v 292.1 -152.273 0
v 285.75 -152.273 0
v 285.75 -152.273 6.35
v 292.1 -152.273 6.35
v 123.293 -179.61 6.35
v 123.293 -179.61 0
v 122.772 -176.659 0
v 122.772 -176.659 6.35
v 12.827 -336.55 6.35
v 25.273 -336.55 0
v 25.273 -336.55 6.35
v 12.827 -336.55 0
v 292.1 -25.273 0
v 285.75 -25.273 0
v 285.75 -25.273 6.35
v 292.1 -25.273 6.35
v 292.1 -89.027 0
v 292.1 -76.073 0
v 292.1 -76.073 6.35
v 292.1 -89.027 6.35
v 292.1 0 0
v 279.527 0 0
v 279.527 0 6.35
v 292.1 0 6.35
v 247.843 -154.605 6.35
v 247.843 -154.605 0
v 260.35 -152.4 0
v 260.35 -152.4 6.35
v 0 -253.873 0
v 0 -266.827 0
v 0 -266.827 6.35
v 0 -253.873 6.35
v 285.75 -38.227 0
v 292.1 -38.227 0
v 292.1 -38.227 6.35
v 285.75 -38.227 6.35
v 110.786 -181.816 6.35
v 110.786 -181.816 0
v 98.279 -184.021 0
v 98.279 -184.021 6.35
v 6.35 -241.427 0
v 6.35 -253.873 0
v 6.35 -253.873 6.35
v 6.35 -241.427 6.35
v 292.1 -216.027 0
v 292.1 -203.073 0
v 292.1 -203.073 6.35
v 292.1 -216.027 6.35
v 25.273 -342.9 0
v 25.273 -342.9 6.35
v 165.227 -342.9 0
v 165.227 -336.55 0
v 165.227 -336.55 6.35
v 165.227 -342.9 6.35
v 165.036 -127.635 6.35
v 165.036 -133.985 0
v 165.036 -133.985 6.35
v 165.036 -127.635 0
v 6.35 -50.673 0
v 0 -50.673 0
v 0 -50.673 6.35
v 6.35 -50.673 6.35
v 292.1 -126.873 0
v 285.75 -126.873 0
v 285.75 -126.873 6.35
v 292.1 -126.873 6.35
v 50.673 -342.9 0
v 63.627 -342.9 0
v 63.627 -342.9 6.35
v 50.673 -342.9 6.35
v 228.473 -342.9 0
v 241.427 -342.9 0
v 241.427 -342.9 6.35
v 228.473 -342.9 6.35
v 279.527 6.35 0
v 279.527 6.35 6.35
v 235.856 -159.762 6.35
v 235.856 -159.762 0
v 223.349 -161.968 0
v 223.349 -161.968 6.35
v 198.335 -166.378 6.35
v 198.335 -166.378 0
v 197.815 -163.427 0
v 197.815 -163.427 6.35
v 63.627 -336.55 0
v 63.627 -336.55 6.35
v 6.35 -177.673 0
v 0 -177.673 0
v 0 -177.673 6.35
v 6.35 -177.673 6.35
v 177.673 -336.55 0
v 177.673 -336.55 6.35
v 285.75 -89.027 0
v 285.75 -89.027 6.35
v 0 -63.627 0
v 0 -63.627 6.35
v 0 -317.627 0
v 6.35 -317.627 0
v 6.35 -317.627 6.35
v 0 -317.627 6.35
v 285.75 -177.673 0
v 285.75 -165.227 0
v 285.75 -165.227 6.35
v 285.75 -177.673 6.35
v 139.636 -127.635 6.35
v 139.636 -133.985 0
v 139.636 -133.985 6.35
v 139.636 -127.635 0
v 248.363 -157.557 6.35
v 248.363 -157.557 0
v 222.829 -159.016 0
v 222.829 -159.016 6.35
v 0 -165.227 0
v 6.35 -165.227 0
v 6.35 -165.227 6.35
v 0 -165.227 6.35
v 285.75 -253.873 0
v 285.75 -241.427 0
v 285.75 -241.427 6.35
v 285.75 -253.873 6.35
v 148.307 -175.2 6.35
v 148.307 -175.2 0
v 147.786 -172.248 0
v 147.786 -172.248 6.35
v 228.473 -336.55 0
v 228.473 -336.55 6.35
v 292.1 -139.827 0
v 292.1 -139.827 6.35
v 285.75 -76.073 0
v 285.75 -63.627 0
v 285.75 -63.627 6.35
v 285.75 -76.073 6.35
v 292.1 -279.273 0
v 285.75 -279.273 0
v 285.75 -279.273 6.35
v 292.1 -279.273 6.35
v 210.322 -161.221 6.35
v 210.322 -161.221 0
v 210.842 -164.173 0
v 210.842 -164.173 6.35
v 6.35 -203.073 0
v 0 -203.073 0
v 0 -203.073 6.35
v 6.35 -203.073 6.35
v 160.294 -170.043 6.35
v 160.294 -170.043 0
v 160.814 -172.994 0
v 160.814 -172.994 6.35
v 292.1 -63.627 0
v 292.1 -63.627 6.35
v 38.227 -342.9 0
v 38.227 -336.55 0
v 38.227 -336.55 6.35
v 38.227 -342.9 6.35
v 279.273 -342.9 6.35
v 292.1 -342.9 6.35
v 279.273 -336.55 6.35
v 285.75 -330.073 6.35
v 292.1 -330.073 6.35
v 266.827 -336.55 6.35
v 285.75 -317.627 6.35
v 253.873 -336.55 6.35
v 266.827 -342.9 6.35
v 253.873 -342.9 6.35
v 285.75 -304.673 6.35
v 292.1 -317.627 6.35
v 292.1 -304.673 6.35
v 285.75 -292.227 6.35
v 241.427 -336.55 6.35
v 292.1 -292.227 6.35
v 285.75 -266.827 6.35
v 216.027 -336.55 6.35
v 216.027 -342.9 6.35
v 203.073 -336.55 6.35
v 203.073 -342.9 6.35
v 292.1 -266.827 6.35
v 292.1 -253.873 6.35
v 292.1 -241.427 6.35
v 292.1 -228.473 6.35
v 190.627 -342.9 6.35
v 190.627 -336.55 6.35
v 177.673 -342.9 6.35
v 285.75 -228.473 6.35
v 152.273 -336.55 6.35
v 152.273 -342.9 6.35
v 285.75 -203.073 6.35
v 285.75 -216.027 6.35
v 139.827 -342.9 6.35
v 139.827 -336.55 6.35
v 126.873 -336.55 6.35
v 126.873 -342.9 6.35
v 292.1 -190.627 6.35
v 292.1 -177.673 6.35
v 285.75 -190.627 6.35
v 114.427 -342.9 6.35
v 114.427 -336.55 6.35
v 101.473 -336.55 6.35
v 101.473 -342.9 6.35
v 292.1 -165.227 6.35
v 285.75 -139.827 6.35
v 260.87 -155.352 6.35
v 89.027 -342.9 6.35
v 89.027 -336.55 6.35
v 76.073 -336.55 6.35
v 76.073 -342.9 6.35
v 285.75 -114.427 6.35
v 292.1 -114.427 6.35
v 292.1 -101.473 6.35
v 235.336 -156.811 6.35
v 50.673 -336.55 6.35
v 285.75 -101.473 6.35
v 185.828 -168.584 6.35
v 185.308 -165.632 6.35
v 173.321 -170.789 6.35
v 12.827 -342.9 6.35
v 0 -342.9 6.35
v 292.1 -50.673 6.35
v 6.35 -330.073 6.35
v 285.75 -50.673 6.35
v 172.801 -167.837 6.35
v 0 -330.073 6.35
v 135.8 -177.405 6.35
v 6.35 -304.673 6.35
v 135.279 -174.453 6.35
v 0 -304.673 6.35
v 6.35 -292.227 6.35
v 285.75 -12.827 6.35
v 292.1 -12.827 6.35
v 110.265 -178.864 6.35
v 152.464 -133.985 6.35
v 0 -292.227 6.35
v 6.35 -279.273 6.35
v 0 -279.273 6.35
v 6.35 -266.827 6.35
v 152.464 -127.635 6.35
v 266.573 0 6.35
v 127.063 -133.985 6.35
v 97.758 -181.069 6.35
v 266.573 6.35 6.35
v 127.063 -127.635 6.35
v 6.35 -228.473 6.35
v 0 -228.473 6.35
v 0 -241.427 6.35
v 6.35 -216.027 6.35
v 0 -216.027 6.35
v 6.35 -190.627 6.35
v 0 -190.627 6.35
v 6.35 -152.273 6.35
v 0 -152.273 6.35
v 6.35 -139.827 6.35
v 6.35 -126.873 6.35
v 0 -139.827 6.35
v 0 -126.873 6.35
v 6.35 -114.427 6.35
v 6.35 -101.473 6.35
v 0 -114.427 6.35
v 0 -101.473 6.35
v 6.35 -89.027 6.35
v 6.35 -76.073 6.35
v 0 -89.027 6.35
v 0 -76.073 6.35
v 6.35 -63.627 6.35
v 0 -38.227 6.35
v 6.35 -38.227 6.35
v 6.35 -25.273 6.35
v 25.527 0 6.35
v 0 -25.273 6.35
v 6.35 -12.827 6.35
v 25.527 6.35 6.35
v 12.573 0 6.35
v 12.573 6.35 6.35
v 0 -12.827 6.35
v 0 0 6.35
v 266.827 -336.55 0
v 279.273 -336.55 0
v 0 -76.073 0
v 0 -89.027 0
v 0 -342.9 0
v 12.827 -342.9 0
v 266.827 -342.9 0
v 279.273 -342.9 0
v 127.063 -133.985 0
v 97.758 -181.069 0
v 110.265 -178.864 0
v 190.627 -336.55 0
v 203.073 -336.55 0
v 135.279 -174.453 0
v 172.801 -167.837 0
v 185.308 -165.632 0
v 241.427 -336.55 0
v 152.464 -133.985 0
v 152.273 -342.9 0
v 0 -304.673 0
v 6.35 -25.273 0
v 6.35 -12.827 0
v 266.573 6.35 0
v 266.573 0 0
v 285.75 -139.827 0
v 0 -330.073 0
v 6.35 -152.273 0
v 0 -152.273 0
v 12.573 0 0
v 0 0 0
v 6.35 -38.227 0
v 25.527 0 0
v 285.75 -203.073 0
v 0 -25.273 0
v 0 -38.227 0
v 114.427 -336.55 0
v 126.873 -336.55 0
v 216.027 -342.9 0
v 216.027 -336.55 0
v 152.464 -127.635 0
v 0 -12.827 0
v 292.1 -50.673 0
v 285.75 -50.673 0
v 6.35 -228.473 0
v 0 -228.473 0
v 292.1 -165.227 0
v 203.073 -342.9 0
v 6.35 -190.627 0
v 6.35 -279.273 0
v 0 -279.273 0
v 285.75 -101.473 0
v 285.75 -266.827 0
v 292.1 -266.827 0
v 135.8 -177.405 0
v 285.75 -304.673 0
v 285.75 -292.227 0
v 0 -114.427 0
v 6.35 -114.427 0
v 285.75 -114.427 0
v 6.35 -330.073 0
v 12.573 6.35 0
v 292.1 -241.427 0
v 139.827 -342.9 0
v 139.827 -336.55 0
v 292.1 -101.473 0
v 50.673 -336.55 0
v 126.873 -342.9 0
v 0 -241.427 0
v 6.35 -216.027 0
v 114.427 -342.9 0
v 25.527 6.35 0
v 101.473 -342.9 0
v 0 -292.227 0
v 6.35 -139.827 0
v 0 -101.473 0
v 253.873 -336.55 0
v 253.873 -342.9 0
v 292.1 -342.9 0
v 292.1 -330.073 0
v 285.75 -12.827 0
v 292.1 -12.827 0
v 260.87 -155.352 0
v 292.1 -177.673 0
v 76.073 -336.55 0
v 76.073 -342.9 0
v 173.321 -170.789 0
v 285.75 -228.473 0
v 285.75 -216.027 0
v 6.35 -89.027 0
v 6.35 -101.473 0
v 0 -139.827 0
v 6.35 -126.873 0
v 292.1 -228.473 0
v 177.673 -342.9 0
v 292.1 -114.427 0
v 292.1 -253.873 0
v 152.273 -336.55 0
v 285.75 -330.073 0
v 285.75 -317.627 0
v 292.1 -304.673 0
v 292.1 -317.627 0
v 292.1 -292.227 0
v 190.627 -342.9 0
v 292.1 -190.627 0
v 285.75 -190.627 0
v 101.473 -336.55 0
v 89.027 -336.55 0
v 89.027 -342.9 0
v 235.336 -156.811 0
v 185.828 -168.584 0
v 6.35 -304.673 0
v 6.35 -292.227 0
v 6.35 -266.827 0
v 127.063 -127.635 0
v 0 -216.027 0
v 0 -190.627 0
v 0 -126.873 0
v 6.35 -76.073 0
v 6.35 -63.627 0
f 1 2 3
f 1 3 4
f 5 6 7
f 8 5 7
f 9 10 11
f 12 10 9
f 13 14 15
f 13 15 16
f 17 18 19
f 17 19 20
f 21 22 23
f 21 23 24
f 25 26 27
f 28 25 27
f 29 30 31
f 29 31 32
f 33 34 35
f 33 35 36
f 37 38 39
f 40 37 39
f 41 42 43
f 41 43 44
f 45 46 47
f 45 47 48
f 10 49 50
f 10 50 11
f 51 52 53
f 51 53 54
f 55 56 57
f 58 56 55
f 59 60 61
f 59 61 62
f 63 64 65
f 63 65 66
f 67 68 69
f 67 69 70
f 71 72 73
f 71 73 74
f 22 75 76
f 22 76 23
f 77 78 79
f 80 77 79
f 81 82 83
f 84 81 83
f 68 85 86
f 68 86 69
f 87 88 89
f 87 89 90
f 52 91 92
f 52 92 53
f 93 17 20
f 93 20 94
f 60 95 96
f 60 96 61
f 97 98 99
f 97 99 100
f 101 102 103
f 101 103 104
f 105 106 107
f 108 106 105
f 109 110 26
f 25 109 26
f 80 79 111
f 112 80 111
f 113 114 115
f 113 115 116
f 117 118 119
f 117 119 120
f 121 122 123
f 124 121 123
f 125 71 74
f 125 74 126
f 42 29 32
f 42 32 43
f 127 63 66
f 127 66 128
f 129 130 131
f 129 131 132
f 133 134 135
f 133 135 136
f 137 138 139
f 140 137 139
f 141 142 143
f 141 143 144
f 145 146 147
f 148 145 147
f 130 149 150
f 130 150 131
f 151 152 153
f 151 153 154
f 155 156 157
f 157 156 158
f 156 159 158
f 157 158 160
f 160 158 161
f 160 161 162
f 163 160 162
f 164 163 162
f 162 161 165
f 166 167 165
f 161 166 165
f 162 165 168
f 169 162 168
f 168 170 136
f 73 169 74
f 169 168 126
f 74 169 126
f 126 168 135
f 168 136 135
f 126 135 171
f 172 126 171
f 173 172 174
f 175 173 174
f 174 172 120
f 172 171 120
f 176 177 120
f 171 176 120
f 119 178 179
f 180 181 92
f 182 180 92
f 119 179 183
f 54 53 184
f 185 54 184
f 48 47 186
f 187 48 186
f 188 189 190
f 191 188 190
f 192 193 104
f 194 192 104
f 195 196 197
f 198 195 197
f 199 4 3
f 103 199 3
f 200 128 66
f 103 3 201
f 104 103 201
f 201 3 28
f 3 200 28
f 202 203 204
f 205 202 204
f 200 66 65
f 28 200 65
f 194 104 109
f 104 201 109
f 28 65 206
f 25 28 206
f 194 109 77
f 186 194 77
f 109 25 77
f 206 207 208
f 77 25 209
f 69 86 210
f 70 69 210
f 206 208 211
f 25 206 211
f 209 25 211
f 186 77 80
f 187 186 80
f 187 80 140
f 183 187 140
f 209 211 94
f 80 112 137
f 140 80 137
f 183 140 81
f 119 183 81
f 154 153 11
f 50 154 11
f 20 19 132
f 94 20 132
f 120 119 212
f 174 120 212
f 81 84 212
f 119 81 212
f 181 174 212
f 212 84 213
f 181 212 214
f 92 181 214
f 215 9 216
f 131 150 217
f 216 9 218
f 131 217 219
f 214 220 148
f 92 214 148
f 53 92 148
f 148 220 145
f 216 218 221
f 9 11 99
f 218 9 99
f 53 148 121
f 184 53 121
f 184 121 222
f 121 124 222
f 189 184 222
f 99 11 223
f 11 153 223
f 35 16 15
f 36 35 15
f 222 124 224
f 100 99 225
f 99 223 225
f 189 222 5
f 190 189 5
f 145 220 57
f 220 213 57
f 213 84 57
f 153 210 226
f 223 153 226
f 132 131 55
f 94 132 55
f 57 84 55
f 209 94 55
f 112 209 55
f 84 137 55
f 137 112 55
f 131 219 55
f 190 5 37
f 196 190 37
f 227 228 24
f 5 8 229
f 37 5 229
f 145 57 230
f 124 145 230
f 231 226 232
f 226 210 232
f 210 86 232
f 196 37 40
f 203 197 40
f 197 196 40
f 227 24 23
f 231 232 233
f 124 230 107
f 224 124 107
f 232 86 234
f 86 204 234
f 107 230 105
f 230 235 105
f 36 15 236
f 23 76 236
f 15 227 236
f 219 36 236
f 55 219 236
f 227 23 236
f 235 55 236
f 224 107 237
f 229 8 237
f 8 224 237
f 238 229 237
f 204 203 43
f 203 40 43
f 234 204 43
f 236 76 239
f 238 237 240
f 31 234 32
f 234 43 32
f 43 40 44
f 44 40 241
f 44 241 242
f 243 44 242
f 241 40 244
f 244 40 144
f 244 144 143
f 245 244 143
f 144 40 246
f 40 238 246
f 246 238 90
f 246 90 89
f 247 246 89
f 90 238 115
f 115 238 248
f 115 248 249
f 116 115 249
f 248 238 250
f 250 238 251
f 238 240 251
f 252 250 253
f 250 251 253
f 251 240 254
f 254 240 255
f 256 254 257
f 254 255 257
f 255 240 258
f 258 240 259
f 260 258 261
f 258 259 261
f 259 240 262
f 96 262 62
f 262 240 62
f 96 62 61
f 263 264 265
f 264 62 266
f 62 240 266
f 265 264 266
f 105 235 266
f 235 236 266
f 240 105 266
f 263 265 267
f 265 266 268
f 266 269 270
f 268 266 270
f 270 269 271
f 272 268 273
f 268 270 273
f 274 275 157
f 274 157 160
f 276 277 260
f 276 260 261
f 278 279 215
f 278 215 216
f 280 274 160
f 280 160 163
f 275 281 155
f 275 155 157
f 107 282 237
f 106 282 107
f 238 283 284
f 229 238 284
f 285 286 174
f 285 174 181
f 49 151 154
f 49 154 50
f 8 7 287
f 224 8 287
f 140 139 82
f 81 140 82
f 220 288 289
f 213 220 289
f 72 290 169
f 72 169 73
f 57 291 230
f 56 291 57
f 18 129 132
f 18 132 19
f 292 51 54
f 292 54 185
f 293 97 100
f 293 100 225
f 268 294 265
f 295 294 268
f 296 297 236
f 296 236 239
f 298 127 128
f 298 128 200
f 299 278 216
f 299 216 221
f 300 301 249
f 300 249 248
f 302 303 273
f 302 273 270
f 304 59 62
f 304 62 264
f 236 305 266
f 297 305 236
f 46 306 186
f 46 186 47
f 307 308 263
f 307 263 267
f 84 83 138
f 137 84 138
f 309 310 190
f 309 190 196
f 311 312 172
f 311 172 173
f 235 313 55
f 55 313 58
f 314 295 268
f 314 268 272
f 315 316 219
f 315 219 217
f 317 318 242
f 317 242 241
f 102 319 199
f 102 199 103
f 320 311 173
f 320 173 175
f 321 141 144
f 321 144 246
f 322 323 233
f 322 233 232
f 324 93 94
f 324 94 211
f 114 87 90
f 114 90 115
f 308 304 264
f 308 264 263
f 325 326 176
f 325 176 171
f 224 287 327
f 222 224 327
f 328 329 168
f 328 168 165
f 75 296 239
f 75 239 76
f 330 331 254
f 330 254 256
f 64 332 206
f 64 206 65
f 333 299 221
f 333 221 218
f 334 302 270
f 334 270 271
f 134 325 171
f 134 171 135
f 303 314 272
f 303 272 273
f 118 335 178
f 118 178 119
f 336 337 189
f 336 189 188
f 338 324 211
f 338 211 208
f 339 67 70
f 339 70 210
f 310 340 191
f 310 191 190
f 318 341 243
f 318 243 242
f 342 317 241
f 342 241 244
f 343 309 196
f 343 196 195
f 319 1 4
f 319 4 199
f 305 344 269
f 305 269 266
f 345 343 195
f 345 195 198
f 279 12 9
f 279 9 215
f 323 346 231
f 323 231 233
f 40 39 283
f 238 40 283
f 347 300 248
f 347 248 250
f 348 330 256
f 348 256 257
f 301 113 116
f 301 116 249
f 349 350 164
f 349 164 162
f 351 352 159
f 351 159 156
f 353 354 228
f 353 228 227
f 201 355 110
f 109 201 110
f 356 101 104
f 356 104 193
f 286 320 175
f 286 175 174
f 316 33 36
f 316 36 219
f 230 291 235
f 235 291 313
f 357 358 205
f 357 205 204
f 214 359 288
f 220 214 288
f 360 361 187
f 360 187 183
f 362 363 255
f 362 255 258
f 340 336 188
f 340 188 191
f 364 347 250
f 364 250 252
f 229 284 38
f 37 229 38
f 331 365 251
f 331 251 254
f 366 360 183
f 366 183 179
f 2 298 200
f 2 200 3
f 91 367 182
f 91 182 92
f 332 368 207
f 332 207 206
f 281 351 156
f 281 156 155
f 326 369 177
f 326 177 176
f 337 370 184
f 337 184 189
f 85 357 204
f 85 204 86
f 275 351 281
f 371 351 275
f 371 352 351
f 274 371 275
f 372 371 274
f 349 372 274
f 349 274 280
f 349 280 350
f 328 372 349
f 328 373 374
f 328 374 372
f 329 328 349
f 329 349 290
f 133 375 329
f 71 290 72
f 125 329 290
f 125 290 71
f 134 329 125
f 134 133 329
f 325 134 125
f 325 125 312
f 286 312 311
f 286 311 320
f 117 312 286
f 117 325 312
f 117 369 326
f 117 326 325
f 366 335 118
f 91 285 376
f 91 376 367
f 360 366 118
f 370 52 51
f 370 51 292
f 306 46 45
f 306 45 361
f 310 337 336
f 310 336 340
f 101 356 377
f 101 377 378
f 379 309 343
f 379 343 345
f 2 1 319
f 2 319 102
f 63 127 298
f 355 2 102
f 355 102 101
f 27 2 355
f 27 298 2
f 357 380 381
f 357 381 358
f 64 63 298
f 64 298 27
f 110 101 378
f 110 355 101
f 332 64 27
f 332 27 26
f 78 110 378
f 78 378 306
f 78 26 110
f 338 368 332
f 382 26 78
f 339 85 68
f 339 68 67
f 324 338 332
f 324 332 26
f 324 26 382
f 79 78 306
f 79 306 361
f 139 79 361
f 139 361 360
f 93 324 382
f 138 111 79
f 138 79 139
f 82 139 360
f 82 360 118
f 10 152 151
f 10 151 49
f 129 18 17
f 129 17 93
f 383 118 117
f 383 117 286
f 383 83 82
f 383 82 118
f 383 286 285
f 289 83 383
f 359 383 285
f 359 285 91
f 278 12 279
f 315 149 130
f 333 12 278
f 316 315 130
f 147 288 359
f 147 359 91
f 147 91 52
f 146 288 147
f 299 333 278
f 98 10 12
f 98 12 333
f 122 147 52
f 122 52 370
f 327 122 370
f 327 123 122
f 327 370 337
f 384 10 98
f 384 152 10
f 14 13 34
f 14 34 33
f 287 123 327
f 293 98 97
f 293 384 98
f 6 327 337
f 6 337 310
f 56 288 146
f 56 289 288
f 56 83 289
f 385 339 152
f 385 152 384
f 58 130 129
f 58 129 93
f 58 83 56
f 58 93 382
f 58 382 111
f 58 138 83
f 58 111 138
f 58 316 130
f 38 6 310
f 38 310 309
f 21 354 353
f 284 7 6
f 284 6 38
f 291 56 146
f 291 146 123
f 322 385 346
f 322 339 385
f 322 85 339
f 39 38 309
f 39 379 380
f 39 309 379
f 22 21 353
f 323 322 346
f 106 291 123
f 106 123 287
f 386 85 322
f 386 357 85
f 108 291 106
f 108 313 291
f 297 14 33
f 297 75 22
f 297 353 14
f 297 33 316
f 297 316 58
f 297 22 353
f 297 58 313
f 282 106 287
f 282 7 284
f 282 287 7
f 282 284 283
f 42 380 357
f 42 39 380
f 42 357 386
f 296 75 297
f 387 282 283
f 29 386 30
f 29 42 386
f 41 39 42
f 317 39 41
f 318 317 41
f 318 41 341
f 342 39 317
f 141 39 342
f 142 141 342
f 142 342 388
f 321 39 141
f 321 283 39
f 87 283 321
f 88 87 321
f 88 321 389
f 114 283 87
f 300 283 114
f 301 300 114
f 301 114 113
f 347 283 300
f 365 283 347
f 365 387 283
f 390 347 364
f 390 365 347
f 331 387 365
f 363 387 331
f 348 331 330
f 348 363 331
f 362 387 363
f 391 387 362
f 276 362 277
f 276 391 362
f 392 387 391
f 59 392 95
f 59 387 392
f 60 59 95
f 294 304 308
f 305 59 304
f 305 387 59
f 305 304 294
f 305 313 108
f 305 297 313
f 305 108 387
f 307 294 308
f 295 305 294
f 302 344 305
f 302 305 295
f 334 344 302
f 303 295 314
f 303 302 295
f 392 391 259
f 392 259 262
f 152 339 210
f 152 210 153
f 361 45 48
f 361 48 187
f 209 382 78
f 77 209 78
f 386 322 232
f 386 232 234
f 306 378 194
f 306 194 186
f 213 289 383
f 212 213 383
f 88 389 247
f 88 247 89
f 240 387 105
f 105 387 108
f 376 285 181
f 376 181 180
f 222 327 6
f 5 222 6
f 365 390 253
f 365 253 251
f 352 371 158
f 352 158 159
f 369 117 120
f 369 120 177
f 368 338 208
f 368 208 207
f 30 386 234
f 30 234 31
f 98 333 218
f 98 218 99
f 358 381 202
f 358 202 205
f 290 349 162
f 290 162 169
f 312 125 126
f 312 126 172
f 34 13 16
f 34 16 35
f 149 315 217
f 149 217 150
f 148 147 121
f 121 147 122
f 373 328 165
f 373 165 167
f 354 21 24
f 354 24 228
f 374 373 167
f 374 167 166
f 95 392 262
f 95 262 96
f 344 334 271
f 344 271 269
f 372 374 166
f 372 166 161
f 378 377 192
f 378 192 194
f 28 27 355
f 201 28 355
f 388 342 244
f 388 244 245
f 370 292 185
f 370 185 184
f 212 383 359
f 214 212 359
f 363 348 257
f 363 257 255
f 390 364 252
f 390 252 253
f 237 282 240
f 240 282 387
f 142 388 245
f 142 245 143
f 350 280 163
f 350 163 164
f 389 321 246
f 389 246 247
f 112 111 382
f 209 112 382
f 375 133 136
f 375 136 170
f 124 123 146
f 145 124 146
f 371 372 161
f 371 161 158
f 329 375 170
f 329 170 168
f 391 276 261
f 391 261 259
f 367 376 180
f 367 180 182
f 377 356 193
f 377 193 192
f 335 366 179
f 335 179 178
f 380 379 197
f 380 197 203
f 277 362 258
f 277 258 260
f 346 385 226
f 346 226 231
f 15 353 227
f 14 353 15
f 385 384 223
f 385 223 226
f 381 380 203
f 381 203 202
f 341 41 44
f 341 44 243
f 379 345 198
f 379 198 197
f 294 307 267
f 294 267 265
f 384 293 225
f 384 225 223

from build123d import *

# Parameters (mm, degrees)
SKETCH1_W           = 12.573
SKETCH1_H           = 6.35
BOSS_EXTRUDE1_DEPTH = 6.35


with BuildPart() as part:
    # Sketch1 → Boss-Extrude1 (new body)
    with BuildSketch(Plane.XY):
        Polygon((0, 0), (12.573, 0), (12.573, 6.35), (25.527, 6.35), (25.527, 0), (266.573, 0), (266.573, 6.35), (279.527, 6.35), (279.527, 0), (292.1, 0), (292.1, -12.827), (285.75, -12.827), (285.75, -25.273), (292.1, -25.273), (292.1, -38.227), (285.75, -38.227), (285.75, -50.673), (292.1, -50.673), (292.1, -63.627), (285.75, -63.627), (285.75, -76.073), (292.1, -76.073), (292.1, -89.027), (285.75, -89.027), (285.75, -101.473), (292.1, -101.473), (292.1, -114.427), (285.75, -114.427), (285.75, -126.873), (292.1, -126.873), (292.1, -139.827), (285.75, -139.827), (285.75, -152.273), (292.1, -152.273), (292.1, -165.227), (285.75, -165.227), (285.75, -177.673), (292.1, -177.673), (292.1, -190.627), (285.75, -190.627), (285.75, -203.073), (292.1, -203.073), (292.1, -216.027), (285.75, -216.027), (285.75, -228.473), (292.1, -228.473), (292.1, -241.427), (285.75, -241.427), (285.75, -253.873), (292.1, -253.873), (292.1, -266.827), (285.75, -266.827), (285.75, -279.273), (292.1, -279.273), (292.1, -292.227), (285.75, -292.227), (285.75, -304.673), (292.1, -304.673), (292.1, -317.627), (285.75, -317.627), (285.75, -330.073), (292.1, -330.073), (292.1, -342.9), (279.273, -342.9), (279.273, -336.55), (266.827, -336.55), (266.827, -342.9), (253.873, -342.9), (253.873, -336.55), (241.427, -336.55), (241.427, -342.9), (228.473, -342.9), (228.473, -336.55), (216.027, -336.55), (216.027, -342.9), (203.073, -342.9), (203.073, -336.55), (190.627, -336.55), (190.627, -342.9), (177.673, -342.9), (177.673, -336.55), (165.227, -336.55), (165.227, -342.9), (152.273, -342.9), (152.273, -336.55), (139.827, -336.55), (139.827, -342.9), (126.873, -342.9), (126.873, -336.55), (114.427, -336.55), (114.427, -342.9), (101.473, -342.9), (101.473, -336.55), (89.027, -336.55), (89.027, -342.9), (76.073, -342.9), (76.073, -336.55), (63.627, -336.55), (63.627, -342.9), (50.673, -342.9), (50.673, -336.55), (38.227, -336.55), (38.227, -342.9), (25.273, -342.9), (25.273, -336.55), (12.827, -336.55), (12.827, -342.9), (0, -342.9), (0, -330.073), (6.35, -330.073), (6.35, -317.627), (0, -317.627), (0, -304.673), (6.35, -304.673), (6.35, -292.227), (0, -292.227), (0, -279.273), (6.35, -279.273), (6.35, -266.827), (0, -266.827), (0, -253.873), (6.35, -253.873), (6.35, -241.427), (0, -241.427), (0, -228.473), (6.35, -228.473), (6.35, -216.027), (0, -216.027), (0, -203.073), (6.35, -203.073), (6.35, -190.627), (0, -190.627), (0, -177.673), (6.35, -177.673), (6.35, -165.227), (0, -165.227), (0, -152.273), (6.35, -152.273), (6.35, -139.827), (0, -139.827), (0, -126.873), (6.35, -126.873), (6.35, -114.427), (0, -114.427), (0, -101.473), (6.35, -101.473), (6.35, -89.027), (0, -89.027), (0, -76.073), (6.35, -76.073), (6.35, -63.627), (0, -63.627), (0, -50.673), (6.35, -50.673), (6.35, -38.227), (0, -38.227), (0, -25.273), (6.35, -25.273), (6.35, -12.827), (0, -12.827), align=None)
        Polygon((260.870458318, -155.351665797), (248.363399855, -157.556997654), (247.842941537, -154.605331856), (260.35, -152.4), align=None, mode=Mode.SUBTRACT)
        Polygon((235.856341392, -159.76232951), (223.349282928, -161.967661366), (222.82882461, -159.015995569), (235.335883073, -156.810663713), align=None, mode=Mode.SUBTRACT)
        with Locations((158.75, -130.81)):
            Rectangle(SKETCH1_W, SKETCH1_H, mode=Mode.SUBTRACT)
        with Locations((133.35, -130.81)):
            Rectangle(SKETCH1_W, SKETCH1_H, mode=Mode.SUBTRACT)
        Polygon((210.842224465, -164.172993223), (198.335166002, -166.378325079), (197.814707684, -163.426659282), (210.321766147, -161.221327425), align=None, mode=Mode.SUBTRACT)
        Polygon((185.828107539, -168.583656936), (173.321049075, -170.788988792), (172.800590757, -167.837322995), (185.30764922, -165.631991138), align=None, mode=Mode.SUBTRACT)
        Polygon((160.813990612, -172.994320648), (148.306932149, -175.199652505), (147.786473831, -172.247986707), (160.293532294, -170.042654851), align=None, mode=Mode.SUBTRACT)
        Polygon((135.799873686, -177.404984361), (123.292815222, -179.610316217), (122.772356904, -176.65865042), (135.279415367, -174.453318564), align=None, mode=Mode.SUBTRACT)
        Polygon((110.785756759, -181.815648074), (98.278698296, -184.02097993), (97.758239978, -181.069314133), (110.265298441, -178.863982276), align=None, mode=Mode.SUBTRACT)
    extrude(amount=BOSS_EXTRUDE1_DEPTH)


solid = part.part
